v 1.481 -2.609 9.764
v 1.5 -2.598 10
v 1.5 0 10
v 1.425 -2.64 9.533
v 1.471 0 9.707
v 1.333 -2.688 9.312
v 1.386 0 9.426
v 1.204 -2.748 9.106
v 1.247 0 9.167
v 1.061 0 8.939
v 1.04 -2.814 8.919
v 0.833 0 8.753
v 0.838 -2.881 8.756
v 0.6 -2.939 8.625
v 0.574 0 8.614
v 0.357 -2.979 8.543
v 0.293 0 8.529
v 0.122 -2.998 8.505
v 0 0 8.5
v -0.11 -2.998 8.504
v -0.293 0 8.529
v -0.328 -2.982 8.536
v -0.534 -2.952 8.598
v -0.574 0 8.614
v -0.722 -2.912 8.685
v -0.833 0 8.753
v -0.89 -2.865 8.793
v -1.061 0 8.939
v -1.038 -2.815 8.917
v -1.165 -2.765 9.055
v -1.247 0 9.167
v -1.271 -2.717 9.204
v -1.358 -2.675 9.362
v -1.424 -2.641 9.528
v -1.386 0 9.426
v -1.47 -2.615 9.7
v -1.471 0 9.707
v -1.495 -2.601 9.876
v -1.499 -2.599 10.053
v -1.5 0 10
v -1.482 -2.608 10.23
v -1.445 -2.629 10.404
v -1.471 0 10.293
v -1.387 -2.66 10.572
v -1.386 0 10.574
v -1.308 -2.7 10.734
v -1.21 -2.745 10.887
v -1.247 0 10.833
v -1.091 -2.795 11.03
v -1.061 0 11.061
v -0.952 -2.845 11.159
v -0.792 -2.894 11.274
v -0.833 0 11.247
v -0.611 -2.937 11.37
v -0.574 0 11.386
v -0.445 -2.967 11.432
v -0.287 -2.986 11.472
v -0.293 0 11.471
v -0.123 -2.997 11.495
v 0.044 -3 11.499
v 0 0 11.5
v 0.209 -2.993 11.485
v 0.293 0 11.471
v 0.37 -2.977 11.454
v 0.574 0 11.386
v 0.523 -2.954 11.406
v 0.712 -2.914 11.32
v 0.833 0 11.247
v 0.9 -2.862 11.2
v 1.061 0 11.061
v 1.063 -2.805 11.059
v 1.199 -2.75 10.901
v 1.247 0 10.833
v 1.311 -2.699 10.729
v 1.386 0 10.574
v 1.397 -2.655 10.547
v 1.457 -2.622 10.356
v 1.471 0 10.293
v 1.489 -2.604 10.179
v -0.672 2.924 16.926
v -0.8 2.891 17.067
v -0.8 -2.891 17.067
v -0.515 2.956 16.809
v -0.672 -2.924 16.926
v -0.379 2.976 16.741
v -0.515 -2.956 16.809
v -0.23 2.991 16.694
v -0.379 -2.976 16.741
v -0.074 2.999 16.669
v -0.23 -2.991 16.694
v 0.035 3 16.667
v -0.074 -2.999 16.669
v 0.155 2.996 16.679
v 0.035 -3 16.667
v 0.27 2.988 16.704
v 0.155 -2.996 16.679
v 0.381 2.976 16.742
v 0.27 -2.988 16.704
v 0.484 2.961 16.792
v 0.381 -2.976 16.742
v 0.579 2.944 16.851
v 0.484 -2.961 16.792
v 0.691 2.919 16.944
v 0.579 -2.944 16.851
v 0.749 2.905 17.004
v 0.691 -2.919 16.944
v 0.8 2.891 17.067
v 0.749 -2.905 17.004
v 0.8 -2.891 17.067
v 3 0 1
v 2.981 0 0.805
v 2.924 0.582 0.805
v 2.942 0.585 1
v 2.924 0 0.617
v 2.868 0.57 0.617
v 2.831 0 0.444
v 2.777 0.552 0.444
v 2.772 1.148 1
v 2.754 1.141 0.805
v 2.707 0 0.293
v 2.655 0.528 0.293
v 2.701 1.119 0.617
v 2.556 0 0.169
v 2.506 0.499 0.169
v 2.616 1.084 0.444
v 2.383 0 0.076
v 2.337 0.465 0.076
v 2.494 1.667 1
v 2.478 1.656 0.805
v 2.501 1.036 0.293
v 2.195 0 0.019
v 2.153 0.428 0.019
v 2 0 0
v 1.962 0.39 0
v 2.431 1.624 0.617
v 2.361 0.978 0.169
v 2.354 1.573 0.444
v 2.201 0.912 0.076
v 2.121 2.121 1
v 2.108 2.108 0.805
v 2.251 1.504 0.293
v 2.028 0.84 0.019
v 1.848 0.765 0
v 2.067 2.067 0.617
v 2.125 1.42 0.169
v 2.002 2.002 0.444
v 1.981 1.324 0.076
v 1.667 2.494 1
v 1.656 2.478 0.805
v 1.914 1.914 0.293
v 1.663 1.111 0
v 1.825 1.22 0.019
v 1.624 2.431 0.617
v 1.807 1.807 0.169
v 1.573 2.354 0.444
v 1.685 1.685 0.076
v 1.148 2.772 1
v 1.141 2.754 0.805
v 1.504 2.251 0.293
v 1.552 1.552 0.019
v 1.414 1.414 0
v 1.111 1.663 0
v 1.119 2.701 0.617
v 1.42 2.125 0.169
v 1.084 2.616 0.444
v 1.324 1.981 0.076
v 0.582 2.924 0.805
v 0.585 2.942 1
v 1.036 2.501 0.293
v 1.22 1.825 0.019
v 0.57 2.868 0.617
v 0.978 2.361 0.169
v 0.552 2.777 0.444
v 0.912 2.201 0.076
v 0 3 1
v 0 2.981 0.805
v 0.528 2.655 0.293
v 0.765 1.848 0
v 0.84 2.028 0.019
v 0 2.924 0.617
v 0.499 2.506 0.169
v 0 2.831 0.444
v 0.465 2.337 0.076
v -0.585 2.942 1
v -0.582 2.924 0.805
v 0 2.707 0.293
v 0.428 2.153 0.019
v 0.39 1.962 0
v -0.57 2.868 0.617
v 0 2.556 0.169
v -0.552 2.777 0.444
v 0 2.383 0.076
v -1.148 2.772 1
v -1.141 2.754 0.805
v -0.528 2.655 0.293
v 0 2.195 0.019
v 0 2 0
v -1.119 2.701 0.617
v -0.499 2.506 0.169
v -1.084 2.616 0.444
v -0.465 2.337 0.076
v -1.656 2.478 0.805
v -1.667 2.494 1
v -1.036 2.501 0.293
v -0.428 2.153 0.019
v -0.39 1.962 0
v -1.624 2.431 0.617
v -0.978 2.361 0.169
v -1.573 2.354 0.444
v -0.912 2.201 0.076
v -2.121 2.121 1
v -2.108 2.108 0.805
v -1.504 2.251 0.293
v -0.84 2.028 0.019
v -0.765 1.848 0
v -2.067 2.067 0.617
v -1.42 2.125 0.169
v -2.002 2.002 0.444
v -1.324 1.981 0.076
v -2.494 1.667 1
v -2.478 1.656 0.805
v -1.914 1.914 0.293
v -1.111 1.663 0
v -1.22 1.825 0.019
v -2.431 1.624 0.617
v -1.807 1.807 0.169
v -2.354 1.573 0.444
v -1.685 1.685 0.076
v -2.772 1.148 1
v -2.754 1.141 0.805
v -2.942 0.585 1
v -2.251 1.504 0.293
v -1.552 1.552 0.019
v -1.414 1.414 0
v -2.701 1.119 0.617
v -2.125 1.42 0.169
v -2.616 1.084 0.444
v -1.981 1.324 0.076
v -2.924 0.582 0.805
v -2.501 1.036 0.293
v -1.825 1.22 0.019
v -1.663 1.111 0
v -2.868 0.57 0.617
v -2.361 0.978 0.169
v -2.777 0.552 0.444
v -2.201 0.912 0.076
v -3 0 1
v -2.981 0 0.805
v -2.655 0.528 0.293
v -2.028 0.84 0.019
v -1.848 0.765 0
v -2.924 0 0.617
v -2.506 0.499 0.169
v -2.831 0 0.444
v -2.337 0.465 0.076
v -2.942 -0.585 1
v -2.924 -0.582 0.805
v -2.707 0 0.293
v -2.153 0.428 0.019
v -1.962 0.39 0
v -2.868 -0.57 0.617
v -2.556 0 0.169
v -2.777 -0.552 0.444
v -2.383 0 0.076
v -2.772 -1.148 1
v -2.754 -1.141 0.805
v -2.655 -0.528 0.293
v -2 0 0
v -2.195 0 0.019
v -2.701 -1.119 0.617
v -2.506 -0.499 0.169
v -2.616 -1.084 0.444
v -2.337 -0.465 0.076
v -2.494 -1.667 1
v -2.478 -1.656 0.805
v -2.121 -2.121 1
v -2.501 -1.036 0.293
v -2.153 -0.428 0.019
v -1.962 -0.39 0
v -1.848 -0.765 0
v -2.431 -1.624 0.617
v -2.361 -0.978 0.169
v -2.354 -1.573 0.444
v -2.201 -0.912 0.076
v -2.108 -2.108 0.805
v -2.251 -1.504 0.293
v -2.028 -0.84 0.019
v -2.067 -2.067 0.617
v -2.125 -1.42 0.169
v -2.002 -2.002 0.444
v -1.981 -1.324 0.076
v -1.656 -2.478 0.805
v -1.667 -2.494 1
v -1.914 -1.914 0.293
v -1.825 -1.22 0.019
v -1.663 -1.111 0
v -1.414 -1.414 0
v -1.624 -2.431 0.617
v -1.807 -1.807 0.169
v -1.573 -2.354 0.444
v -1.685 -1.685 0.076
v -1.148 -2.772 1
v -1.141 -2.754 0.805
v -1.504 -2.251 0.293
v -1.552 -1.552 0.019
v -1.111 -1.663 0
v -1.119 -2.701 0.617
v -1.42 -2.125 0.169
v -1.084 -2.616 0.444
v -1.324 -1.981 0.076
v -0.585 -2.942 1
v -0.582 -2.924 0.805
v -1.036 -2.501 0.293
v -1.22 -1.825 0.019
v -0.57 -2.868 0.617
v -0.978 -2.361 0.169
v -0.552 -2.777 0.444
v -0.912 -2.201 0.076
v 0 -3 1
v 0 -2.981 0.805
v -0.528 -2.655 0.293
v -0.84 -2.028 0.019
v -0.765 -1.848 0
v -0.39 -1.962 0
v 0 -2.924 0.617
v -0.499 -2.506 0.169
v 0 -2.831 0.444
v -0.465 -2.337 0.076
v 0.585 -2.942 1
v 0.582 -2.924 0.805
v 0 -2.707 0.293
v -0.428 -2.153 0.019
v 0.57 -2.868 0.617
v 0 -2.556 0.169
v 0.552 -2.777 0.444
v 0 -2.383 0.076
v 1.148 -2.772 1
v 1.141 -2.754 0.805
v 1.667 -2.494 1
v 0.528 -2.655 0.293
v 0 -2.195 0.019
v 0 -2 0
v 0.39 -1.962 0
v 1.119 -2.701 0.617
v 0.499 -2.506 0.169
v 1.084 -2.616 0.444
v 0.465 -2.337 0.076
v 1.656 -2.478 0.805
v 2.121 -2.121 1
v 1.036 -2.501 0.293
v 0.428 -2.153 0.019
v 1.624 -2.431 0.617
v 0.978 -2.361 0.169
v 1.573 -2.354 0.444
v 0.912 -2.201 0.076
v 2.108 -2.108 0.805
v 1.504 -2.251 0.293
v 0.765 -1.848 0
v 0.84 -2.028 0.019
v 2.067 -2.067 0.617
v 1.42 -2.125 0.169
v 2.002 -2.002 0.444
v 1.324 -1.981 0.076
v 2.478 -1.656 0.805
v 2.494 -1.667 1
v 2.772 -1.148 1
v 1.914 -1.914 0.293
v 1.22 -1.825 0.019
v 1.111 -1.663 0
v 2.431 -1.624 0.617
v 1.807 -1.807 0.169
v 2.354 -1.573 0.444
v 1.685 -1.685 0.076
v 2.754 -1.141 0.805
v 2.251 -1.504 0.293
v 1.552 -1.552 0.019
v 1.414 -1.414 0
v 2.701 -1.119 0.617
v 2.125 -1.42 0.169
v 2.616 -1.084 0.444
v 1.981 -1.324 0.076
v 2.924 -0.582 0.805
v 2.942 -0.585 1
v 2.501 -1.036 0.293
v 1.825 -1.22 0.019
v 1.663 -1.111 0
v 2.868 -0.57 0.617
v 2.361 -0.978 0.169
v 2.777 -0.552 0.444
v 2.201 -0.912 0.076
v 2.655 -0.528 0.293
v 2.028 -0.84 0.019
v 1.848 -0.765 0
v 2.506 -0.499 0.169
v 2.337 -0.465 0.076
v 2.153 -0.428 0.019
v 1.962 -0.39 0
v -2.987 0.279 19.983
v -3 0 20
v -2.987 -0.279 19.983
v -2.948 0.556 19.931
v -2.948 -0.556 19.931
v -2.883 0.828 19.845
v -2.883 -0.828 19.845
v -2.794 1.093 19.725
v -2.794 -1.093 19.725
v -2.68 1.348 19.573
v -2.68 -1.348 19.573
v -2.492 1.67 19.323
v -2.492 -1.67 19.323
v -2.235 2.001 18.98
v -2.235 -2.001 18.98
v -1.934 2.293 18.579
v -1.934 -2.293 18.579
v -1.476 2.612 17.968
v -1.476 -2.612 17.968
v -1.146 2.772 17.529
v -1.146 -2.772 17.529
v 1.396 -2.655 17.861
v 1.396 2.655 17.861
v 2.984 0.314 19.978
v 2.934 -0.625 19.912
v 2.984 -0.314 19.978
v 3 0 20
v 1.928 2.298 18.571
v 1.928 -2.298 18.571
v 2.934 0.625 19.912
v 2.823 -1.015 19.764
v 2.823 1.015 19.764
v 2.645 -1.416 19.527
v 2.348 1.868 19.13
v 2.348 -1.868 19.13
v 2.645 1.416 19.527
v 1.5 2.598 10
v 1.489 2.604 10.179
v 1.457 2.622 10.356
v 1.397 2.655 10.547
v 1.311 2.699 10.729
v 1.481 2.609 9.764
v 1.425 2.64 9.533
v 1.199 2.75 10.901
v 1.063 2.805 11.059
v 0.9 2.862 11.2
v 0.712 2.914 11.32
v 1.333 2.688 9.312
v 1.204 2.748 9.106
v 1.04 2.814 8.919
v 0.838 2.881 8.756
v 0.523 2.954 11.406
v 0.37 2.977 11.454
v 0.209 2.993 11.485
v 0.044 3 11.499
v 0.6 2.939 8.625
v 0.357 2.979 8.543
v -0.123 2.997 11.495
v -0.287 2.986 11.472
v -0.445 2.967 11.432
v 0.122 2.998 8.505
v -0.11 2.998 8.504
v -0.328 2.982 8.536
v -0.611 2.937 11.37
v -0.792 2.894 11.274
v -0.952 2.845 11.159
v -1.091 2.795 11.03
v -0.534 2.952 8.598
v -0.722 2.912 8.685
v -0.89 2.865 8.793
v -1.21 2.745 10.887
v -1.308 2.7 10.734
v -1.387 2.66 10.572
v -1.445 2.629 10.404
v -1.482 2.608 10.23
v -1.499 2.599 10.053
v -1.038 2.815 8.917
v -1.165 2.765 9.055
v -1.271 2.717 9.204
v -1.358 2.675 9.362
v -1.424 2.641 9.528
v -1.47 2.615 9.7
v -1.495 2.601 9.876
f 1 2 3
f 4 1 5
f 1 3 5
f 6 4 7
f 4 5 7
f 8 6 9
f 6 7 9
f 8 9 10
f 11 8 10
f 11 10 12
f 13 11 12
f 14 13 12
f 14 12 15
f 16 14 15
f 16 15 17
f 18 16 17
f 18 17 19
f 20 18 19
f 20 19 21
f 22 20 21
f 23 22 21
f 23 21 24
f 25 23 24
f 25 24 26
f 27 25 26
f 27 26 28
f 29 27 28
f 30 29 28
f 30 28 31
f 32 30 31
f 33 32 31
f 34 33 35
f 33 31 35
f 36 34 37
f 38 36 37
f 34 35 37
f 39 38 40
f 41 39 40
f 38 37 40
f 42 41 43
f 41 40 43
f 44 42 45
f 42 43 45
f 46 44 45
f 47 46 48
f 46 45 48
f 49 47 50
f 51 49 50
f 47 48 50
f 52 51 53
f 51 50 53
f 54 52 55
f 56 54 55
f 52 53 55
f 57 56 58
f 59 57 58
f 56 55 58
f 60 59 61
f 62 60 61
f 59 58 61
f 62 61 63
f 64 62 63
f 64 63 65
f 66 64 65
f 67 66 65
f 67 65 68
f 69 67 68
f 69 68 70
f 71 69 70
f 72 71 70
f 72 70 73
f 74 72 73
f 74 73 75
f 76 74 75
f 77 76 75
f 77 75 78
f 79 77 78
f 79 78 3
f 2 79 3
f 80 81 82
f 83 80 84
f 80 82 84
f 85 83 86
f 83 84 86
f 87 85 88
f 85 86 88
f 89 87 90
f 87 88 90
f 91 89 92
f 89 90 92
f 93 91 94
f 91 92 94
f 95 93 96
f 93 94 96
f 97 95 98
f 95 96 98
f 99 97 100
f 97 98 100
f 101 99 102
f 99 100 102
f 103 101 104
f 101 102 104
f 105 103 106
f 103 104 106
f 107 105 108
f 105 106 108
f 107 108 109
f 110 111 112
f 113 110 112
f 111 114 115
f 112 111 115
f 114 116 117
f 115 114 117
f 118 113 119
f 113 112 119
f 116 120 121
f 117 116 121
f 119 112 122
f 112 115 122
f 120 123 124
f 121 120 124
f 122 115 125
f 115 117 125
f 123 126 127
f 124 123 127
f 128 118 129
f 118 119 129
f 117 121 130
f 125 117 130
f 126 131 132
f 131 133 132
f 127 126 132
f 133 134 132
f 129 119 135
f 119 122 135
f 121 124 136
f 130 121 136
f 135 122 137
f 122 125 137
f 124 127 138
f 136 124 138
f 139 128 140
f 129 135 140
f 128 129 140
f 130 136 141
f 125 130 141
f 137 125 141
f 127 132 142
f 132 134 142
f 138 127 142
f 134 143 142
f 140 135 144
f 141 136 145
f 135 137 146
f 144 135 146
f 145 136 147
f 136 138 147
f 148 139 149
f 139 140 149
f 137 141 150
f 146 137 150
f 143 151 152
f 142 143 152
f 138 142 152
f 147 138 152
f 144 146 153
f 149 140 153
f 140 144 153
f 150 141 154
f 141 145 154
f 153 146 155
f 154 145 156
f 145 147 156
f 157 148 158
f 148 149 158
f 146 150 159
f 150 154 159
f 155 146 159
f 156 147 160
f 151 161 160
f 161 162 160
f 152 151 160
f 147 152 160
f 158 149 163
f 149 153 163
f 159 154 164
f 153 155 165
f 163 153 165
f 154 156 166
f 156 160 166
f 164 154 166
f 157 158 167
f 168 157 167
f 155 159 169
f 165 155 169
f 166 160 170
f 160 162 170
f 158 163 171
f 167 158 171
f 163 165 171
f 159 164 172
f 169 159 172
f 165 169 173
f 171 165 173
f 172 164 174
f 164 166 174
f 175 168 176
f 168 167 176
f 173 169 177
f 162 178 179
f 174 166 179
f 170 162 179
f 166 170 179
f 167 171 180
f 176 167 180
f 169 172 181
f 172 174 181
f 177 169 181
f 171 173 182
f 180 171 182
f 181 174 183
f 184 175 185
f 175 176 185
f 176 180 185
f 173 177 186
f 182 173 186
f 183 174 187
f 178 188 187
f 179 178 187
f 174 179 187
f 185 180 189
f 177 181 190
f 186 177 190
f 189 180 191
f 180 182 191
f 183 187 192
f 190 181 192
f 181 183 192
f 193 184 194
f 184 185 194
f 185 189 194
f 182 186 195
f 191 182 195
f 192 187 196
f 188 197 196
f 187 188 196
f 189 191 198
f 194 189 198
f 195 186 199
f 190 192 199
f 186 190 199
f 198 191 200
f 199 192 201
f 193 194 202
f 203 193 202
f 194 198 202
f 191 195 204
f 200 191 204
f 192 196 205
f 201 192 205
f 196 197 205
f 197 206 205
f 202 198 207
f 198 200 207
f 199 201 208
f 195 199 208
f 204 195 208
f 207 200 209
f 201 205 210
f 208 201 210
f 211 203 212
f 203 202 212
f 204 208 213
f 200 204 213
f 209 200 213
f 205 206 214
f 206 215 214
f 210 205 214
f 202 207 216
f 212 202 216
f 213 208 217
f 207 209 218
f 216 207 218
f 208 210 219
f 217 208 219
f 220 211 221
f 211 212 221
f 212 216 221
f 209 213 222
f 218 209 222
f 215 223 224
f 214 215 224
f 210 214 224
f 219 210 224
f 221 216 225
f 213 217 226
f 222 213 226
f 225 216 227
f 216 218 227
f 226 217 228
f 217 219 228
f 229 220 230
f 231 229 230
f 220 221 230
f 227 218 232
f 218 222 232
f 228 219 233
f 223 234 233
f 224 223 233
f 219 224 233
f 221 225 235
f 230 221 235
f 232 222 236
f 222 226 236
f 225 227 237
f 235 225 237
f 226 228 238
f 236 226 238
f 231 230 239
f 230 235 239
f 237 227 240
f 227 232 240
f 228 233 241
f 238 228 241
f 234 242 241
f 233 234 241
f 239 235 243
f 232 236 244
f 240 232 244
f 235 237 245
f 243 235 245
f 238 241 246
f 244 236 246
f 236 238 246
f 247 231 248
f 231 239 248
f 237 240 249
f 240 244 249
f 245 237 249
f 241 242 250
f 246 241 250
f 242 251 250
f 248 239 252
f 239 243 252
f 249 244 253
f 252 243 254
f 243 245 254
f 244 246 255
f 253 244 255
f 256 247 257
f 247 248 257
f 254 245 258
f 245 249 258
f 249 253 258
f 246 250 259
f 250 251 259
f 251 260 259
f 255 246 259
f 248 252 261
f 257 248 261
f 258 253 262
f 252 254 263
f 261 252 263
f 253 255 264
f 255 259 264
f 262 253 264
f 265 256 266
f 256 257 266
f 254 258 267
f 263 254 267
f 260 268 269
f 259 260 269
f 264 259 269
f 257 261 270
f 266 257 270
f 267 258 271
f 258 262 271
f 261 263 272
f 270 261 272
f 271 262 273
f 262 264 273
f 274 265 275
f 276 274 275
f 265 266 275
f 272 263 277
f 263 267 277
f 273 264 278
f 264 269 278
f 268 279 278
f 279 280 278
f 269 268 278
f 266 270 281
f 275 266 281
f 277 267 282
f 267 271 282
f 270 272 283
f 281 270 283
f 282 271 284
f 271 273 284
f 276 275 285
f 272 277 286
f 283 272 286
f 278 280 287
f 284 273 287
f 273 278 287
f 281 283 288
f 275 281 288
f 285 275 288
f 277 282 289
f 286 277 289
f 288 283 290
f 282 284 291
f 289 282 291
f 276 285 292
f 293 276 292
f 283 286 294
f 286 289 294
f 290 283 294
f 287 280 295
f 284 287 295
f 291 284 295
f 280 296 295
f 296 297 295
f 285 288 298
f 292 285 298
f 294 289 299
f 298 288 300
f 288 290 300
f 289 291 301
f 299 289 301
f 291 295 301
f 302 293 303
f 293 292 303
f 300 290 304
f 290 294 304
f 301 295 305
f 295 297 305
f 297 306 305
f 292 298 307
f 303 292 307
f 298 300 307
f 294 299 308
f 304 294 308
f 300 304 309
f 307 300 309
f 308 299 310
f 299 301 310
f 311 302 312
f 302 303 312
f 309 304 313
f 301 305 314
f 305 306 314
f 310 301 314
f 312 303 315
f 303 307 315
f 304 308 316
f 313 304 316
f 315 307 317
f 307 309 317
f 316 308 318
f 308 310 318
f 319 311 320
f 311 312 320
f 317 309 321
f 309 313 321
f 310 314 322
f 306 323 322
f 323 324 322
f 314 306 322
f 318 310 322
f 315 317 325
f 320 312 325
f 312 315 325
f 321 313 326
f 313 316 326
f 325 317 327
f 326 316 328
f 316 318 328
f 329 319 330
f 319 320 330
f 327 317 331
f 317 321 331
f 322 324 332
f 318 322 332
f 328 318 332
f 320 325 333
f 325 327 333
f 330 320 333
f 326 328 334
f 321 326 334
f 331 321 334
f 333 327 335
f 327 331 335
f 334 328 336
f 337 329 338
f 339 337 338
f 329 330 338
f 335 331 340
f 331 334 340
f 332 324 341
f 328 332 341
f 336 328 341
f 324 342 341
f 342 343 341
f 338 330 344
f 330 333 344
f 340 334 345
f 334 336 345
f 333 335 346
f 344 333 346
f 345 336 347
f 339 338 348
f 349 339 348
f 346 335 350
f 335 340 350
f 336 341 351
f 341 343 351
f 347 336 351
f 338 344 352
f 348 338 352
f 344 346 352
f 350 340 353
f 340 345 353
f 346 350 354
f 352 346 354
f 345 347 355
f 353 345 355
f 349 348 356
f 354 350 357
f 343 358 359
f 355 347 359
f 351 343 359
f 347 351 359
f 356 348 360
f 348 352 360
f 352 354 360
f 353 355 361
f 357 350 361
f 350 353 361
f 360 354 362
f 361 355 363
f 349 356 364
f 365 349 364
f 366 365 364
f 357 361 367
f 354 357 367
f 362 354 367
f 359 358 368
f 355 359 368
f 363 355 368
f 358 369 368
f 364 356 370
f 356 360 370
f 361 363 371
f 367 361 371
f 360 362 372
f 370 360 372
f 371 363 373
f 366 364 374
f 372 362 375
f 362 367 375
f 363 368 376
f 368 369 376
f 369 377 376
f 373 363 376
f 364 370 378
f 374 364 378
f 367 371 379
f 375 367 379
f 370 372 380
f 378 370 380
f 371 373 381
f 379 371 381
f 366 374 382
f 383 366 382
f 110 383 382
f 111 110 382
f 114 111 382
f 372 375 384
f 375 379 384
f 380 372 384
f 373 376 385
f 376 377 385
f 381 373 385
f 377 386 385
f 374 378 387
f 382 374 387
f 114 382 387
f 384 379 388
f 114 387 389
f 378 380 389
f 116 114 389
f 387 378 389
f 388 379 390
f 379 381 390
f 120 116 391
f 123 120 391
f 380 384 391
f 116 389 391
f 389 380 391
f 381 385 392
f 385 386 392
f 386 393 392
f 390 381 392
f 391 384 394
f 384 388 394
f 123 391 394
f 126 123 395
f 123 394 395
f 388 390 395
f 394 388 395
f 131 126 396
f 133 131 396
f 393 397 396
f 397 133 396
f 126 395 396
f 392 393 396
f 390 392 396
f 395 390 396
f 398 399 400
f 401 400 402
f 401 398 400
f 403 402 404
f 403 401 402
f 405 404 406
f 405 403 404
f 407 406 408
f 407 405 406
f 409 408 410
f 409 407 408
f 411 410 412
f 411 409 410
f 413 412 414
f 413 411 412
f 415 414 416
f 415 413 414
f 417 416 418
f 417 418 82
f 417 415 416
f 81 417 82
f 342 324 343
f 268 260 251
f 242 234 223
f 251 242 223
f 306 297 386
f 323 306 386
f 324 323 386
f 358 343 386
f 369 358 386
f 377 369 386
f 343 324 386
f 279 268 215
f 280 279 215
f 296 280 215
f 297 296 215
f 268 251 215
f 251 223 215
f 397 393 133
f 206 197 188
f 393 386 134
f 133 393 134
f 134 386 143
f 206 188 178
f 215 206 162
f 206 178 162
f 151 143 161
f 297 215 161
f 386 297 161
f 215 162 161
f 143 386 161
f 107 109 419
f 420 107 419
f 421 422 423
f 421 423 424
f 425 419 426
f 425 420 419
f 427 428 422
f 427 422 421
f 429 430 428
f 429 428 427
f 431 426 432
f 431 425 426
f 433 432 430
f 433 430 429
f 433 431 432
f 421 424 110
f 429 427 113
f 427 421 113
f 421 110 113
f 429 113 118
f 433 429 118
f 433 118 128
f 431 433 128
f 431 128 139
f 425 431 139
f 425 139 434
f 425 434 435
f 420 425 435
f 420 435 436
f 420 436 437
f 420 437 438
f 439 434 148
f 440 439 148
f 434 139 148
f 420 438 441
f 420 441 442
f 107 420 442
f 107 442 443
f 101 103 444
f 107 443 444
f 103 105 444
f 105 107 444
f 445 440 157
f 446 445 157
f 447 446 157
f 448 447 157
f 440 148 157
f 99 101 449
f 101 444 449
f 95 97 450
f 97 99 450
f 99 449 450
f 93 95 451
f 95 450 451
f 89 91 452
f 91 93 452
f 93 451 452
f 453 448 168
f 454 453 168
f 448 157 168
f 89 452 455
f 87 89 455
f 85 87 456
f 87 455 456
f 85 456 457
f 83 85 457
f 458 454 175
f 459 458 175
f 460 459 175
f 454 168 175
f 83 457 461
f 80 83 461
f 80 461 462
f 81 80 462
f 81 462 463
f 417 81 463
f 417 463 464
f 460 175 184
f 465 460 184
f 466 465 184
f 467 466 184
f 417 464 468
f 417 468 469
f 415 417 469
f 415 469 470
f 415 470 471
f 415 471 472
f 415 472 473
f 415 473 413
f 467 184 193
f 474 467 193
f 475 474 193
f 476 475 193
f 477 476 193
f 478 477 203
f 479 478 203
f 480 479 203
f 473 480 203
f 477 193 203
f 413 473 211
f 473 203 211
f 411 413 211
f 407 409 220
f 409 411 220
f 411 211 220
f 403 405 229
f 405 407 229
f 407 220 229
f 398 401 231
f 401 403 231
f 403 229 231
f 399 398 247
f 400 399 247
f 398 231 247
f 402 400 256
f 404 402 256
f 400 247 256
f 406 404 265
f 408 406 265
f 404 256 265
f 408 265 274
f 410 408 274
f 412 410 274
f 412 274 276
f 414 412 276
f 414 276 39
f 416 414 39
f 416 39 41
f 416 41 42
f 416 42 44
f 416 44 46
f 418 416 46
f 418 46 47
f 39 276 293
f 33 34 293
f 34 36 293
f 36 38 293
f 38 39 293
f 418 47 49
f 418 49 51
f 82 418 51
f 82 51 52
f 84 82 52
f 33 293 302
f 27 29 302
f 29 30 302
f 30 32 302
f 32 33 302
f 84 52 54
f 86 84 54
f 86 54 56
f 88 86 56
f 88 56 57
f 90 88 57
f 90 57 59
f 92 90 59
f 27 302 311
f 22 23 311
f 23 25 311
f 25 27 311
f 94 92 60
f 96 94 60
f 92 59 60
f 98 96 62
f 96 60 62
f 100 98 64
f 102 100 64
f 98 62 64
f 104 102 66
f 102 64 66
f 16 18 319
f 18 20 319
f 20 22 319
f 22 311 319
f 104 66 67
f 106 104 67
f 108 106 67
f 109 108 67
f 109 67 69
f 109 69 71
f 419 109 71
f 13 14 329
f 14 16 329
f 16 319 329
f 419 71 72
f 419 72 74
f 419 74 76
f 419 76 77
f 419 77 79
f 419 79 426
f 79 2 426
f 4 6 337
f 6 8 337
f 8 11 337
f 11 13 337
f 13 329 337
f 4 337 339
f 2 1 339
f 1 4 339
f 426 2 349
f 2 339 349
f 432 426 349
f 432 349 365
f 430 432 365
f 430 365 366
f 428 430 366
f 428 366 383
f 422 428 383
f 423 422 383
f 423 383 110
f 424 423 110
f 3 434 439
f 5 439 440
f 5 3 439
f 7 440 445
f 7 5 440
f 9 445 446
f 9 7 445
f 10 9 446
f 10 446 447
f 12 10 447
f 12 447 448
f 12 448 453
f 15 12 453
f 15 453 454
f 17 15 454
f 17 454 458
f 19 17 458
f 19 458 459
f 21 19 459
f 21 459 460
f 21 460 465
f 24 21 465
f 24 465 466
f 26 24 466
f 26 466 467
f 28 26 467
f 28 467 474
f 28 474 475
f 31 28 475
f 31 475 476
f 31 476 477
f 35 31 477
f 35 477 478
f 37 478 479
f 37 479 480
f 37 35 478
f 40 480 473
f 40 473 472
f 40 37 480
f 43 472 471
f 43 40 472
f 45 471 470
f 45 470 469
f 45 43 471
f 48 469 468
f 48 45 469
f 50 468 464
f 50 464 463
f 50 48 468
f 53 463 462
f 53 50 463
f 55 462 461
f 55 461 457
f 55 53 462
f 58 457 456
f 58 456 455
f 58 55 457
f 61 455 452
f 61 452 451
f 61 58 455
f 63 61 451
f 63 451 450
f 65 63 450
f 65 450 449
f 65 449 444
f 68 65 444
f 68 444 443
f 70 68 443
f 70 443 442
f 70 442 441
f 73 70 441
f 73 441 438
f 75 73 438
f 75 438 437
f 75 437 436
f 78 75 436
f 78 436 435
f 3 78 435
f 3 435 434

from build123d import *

# Parameters (mm, degrees)
CROQUIS1_R                 = 3
SALIENTE_EXTRUIR2_DEPTH    = 20
CROQUIS2_R                 = 1.5
CORTAR_EXTRUIR1_DEPTH      = 4
CORTAR_EXTRUIR1_DEPTH_BACK = 4
REDONDEO7_R                = 1


with BuildPart() as part:
    # Croquis1 → Saliente-Extruir2 (new body)
    with BuildSketch(Plane.XY):
        Circle(CROQUIS1_R)
    extrude(amount=SALIENTE_EXTRUIR2_DEPTH)

    # Croquis2 → Cortar-Extruir1 (cut, two sides)
    with BuildSketch(Plane(origin=(0, 0, 0), x_dir=(1, 0, 0), z_dir=(0, 1, 0))) as cortar_extruir1_sk:
        with Locations((0, -10)):
            Circle(CROQUIS2_R)
        Polygon((-3, -20), (0, -16), (3, -20), align=None)
    extrude(amount=CORTAR_EXTRUIR1_DEPTH, mode=Mode.SUBTRACT)
    extrude(cortar_extruir1_sk.sketch, amount=-CORTAR_EXTRUIR1_DEPTH_BACK, mode=Mode.SUBTRACT)

    # Redondeo7
    redondeo7_edges = [part.edges().sort_by_distance(p)[0] for p in [
        (-3, 0, 0),
        (0, 0, 16),
    ]]
    fillet(redondeo7_edges, radius=REDONDEO7_R)


solid = part.part
